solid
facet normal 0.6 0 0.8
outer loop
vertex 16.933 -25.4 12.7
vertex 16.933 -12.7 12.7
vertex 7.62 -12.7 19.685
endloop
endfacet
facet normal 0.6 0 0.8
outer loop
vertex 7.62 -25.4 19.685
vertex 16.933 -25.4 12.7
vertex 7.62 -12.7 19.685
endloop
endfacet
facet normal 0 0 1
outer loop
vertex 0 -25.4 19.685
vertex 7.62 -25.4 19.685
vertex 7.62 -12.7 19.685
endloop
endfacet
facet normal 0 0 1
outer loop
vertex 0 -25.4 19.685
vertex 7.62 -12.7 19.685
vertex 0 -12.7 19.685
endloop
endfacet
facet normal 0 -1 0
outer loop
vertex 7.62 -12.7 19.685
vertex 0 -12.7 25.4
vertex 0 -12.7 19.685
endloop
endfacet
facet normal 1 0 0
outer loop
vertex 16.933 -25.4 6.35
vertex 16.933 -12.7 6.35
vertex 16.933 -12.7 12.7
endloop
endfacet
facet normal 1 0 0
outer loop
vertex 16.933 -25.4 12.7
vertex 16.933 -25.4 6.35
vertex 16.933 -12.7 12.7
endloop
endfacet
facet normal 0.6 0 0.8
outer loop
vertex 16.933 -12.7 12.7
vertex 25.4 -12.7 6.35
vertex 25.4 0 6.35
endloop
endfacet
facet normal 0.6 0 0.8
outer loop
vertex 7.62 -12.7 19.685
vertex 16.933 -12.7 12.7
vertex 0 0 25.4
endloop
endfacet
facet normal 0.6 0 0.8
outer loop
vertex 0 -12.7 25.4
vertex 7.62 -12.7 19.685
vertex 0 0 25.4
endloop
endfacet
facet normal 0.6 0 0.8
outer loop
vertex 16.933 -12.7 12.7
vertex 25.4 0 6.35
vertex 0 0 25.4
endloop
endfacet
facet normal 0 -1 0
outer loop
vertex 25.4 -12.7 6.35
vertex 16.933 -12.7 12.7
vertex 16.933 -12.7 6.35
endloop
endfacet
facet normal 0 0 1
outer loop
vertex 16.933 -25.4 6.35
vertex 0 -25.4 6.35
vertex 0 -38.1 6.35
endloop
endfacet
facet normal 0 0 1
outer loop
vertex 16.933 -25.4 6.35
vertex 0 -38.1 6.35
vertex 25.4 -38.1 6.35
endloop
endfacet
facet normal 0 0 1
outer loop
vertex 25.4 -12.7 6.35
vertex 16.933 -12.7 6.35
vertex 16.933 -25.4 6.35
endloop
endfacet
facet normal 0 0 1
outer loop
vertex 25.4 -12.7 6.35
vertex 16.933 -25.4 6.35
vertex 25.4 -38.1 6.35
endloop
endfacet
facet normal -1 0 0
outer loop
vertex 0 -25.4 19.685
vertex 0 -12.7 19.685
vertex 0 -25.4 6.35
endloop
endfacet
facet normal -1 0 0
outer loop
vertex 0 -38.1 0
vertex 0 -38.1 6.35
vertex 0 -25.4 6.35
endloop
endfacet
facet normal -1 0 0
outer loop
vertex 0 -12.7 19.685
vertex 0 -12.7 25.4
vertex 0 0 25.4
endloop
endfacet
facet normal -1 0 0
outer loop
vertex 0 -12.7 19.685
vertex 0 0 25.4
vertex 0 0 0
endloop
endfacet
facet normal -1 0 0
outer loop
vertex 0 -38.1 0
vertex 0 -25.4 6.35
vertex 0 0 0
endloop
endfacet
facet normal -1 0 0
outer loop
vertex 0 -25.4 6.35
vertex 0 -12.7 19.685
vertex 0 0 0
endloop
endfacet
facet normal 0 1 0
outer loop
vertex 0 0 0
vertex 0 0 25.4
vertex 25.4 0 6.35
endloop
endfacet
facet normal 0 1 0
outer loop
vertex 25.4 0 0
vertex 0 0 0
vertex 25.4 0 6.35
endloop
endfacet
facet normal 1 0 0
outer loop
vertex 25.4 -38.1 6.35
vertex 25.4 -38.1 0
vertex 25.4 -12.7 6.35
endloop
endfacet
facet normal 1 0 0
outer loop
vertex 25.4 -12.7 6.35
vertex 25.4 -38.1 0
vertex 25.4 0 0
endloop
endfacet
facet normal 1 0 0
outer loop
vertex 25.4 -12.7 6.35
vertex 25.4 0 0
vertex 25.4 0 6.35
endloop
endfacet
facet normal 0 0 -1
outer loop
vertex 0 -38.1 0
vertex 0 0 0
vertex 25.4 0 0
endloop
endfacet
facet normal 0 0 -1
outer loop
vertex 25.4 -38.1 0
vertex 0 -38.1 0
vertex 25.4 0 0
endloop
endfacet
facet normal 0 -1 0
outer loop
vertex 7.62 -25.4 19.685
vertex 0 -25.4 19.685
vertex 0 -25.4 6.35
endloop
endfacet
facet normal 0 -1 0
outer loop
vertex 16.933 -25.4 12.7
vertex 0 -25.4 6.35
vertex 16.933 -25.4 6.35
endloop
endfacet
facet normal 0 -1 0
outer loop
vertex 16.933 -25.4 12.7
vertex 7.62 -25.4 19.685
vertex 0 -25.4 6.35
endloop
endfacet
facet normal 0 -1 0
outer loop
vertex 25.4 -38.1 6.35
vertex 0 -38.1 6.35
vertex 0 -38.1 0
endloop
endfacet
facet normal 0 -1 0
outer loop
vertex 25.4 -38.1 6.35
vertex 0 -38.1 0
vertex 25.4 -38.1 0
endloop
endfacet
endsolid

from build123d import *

# Parameters (mm, degrees)
F0_W     = 25.4
F0_H     = 6.35
F1_DEPTH = 38.1
F3_DEPTH = 12.7
F5_DEPTH = 12.7


with BuildPart() as f1:
    # F0 (on Front) → F1 (new body)
    with BuildSketch(Plane.XZ):
        with Locations((12.7, 3.175)):
            Rectangle(F0_W, F0_H)
    extrude(amount=F1_DEPTH)

    # F2 (on Front) → F3 (join)
    with BuildSketch(Plane.XZ):
        Polygon((0, 25.4), (0, 6.35), (25.4, 6.35), align=None)
    extrude(amount=F3_DEPTH)

    # F4 (on face) → F5 (join)
    with BuildSketch(Plane.XZ.offset(12.7)):
        Polygon((0, 19.685), (0, 6.35), (16.933333, 6.35), (16.933333, 12.7), (7.62, 19.685), align=None)
    extrude(amount=F5_DEPTH)


solid = f1.part
